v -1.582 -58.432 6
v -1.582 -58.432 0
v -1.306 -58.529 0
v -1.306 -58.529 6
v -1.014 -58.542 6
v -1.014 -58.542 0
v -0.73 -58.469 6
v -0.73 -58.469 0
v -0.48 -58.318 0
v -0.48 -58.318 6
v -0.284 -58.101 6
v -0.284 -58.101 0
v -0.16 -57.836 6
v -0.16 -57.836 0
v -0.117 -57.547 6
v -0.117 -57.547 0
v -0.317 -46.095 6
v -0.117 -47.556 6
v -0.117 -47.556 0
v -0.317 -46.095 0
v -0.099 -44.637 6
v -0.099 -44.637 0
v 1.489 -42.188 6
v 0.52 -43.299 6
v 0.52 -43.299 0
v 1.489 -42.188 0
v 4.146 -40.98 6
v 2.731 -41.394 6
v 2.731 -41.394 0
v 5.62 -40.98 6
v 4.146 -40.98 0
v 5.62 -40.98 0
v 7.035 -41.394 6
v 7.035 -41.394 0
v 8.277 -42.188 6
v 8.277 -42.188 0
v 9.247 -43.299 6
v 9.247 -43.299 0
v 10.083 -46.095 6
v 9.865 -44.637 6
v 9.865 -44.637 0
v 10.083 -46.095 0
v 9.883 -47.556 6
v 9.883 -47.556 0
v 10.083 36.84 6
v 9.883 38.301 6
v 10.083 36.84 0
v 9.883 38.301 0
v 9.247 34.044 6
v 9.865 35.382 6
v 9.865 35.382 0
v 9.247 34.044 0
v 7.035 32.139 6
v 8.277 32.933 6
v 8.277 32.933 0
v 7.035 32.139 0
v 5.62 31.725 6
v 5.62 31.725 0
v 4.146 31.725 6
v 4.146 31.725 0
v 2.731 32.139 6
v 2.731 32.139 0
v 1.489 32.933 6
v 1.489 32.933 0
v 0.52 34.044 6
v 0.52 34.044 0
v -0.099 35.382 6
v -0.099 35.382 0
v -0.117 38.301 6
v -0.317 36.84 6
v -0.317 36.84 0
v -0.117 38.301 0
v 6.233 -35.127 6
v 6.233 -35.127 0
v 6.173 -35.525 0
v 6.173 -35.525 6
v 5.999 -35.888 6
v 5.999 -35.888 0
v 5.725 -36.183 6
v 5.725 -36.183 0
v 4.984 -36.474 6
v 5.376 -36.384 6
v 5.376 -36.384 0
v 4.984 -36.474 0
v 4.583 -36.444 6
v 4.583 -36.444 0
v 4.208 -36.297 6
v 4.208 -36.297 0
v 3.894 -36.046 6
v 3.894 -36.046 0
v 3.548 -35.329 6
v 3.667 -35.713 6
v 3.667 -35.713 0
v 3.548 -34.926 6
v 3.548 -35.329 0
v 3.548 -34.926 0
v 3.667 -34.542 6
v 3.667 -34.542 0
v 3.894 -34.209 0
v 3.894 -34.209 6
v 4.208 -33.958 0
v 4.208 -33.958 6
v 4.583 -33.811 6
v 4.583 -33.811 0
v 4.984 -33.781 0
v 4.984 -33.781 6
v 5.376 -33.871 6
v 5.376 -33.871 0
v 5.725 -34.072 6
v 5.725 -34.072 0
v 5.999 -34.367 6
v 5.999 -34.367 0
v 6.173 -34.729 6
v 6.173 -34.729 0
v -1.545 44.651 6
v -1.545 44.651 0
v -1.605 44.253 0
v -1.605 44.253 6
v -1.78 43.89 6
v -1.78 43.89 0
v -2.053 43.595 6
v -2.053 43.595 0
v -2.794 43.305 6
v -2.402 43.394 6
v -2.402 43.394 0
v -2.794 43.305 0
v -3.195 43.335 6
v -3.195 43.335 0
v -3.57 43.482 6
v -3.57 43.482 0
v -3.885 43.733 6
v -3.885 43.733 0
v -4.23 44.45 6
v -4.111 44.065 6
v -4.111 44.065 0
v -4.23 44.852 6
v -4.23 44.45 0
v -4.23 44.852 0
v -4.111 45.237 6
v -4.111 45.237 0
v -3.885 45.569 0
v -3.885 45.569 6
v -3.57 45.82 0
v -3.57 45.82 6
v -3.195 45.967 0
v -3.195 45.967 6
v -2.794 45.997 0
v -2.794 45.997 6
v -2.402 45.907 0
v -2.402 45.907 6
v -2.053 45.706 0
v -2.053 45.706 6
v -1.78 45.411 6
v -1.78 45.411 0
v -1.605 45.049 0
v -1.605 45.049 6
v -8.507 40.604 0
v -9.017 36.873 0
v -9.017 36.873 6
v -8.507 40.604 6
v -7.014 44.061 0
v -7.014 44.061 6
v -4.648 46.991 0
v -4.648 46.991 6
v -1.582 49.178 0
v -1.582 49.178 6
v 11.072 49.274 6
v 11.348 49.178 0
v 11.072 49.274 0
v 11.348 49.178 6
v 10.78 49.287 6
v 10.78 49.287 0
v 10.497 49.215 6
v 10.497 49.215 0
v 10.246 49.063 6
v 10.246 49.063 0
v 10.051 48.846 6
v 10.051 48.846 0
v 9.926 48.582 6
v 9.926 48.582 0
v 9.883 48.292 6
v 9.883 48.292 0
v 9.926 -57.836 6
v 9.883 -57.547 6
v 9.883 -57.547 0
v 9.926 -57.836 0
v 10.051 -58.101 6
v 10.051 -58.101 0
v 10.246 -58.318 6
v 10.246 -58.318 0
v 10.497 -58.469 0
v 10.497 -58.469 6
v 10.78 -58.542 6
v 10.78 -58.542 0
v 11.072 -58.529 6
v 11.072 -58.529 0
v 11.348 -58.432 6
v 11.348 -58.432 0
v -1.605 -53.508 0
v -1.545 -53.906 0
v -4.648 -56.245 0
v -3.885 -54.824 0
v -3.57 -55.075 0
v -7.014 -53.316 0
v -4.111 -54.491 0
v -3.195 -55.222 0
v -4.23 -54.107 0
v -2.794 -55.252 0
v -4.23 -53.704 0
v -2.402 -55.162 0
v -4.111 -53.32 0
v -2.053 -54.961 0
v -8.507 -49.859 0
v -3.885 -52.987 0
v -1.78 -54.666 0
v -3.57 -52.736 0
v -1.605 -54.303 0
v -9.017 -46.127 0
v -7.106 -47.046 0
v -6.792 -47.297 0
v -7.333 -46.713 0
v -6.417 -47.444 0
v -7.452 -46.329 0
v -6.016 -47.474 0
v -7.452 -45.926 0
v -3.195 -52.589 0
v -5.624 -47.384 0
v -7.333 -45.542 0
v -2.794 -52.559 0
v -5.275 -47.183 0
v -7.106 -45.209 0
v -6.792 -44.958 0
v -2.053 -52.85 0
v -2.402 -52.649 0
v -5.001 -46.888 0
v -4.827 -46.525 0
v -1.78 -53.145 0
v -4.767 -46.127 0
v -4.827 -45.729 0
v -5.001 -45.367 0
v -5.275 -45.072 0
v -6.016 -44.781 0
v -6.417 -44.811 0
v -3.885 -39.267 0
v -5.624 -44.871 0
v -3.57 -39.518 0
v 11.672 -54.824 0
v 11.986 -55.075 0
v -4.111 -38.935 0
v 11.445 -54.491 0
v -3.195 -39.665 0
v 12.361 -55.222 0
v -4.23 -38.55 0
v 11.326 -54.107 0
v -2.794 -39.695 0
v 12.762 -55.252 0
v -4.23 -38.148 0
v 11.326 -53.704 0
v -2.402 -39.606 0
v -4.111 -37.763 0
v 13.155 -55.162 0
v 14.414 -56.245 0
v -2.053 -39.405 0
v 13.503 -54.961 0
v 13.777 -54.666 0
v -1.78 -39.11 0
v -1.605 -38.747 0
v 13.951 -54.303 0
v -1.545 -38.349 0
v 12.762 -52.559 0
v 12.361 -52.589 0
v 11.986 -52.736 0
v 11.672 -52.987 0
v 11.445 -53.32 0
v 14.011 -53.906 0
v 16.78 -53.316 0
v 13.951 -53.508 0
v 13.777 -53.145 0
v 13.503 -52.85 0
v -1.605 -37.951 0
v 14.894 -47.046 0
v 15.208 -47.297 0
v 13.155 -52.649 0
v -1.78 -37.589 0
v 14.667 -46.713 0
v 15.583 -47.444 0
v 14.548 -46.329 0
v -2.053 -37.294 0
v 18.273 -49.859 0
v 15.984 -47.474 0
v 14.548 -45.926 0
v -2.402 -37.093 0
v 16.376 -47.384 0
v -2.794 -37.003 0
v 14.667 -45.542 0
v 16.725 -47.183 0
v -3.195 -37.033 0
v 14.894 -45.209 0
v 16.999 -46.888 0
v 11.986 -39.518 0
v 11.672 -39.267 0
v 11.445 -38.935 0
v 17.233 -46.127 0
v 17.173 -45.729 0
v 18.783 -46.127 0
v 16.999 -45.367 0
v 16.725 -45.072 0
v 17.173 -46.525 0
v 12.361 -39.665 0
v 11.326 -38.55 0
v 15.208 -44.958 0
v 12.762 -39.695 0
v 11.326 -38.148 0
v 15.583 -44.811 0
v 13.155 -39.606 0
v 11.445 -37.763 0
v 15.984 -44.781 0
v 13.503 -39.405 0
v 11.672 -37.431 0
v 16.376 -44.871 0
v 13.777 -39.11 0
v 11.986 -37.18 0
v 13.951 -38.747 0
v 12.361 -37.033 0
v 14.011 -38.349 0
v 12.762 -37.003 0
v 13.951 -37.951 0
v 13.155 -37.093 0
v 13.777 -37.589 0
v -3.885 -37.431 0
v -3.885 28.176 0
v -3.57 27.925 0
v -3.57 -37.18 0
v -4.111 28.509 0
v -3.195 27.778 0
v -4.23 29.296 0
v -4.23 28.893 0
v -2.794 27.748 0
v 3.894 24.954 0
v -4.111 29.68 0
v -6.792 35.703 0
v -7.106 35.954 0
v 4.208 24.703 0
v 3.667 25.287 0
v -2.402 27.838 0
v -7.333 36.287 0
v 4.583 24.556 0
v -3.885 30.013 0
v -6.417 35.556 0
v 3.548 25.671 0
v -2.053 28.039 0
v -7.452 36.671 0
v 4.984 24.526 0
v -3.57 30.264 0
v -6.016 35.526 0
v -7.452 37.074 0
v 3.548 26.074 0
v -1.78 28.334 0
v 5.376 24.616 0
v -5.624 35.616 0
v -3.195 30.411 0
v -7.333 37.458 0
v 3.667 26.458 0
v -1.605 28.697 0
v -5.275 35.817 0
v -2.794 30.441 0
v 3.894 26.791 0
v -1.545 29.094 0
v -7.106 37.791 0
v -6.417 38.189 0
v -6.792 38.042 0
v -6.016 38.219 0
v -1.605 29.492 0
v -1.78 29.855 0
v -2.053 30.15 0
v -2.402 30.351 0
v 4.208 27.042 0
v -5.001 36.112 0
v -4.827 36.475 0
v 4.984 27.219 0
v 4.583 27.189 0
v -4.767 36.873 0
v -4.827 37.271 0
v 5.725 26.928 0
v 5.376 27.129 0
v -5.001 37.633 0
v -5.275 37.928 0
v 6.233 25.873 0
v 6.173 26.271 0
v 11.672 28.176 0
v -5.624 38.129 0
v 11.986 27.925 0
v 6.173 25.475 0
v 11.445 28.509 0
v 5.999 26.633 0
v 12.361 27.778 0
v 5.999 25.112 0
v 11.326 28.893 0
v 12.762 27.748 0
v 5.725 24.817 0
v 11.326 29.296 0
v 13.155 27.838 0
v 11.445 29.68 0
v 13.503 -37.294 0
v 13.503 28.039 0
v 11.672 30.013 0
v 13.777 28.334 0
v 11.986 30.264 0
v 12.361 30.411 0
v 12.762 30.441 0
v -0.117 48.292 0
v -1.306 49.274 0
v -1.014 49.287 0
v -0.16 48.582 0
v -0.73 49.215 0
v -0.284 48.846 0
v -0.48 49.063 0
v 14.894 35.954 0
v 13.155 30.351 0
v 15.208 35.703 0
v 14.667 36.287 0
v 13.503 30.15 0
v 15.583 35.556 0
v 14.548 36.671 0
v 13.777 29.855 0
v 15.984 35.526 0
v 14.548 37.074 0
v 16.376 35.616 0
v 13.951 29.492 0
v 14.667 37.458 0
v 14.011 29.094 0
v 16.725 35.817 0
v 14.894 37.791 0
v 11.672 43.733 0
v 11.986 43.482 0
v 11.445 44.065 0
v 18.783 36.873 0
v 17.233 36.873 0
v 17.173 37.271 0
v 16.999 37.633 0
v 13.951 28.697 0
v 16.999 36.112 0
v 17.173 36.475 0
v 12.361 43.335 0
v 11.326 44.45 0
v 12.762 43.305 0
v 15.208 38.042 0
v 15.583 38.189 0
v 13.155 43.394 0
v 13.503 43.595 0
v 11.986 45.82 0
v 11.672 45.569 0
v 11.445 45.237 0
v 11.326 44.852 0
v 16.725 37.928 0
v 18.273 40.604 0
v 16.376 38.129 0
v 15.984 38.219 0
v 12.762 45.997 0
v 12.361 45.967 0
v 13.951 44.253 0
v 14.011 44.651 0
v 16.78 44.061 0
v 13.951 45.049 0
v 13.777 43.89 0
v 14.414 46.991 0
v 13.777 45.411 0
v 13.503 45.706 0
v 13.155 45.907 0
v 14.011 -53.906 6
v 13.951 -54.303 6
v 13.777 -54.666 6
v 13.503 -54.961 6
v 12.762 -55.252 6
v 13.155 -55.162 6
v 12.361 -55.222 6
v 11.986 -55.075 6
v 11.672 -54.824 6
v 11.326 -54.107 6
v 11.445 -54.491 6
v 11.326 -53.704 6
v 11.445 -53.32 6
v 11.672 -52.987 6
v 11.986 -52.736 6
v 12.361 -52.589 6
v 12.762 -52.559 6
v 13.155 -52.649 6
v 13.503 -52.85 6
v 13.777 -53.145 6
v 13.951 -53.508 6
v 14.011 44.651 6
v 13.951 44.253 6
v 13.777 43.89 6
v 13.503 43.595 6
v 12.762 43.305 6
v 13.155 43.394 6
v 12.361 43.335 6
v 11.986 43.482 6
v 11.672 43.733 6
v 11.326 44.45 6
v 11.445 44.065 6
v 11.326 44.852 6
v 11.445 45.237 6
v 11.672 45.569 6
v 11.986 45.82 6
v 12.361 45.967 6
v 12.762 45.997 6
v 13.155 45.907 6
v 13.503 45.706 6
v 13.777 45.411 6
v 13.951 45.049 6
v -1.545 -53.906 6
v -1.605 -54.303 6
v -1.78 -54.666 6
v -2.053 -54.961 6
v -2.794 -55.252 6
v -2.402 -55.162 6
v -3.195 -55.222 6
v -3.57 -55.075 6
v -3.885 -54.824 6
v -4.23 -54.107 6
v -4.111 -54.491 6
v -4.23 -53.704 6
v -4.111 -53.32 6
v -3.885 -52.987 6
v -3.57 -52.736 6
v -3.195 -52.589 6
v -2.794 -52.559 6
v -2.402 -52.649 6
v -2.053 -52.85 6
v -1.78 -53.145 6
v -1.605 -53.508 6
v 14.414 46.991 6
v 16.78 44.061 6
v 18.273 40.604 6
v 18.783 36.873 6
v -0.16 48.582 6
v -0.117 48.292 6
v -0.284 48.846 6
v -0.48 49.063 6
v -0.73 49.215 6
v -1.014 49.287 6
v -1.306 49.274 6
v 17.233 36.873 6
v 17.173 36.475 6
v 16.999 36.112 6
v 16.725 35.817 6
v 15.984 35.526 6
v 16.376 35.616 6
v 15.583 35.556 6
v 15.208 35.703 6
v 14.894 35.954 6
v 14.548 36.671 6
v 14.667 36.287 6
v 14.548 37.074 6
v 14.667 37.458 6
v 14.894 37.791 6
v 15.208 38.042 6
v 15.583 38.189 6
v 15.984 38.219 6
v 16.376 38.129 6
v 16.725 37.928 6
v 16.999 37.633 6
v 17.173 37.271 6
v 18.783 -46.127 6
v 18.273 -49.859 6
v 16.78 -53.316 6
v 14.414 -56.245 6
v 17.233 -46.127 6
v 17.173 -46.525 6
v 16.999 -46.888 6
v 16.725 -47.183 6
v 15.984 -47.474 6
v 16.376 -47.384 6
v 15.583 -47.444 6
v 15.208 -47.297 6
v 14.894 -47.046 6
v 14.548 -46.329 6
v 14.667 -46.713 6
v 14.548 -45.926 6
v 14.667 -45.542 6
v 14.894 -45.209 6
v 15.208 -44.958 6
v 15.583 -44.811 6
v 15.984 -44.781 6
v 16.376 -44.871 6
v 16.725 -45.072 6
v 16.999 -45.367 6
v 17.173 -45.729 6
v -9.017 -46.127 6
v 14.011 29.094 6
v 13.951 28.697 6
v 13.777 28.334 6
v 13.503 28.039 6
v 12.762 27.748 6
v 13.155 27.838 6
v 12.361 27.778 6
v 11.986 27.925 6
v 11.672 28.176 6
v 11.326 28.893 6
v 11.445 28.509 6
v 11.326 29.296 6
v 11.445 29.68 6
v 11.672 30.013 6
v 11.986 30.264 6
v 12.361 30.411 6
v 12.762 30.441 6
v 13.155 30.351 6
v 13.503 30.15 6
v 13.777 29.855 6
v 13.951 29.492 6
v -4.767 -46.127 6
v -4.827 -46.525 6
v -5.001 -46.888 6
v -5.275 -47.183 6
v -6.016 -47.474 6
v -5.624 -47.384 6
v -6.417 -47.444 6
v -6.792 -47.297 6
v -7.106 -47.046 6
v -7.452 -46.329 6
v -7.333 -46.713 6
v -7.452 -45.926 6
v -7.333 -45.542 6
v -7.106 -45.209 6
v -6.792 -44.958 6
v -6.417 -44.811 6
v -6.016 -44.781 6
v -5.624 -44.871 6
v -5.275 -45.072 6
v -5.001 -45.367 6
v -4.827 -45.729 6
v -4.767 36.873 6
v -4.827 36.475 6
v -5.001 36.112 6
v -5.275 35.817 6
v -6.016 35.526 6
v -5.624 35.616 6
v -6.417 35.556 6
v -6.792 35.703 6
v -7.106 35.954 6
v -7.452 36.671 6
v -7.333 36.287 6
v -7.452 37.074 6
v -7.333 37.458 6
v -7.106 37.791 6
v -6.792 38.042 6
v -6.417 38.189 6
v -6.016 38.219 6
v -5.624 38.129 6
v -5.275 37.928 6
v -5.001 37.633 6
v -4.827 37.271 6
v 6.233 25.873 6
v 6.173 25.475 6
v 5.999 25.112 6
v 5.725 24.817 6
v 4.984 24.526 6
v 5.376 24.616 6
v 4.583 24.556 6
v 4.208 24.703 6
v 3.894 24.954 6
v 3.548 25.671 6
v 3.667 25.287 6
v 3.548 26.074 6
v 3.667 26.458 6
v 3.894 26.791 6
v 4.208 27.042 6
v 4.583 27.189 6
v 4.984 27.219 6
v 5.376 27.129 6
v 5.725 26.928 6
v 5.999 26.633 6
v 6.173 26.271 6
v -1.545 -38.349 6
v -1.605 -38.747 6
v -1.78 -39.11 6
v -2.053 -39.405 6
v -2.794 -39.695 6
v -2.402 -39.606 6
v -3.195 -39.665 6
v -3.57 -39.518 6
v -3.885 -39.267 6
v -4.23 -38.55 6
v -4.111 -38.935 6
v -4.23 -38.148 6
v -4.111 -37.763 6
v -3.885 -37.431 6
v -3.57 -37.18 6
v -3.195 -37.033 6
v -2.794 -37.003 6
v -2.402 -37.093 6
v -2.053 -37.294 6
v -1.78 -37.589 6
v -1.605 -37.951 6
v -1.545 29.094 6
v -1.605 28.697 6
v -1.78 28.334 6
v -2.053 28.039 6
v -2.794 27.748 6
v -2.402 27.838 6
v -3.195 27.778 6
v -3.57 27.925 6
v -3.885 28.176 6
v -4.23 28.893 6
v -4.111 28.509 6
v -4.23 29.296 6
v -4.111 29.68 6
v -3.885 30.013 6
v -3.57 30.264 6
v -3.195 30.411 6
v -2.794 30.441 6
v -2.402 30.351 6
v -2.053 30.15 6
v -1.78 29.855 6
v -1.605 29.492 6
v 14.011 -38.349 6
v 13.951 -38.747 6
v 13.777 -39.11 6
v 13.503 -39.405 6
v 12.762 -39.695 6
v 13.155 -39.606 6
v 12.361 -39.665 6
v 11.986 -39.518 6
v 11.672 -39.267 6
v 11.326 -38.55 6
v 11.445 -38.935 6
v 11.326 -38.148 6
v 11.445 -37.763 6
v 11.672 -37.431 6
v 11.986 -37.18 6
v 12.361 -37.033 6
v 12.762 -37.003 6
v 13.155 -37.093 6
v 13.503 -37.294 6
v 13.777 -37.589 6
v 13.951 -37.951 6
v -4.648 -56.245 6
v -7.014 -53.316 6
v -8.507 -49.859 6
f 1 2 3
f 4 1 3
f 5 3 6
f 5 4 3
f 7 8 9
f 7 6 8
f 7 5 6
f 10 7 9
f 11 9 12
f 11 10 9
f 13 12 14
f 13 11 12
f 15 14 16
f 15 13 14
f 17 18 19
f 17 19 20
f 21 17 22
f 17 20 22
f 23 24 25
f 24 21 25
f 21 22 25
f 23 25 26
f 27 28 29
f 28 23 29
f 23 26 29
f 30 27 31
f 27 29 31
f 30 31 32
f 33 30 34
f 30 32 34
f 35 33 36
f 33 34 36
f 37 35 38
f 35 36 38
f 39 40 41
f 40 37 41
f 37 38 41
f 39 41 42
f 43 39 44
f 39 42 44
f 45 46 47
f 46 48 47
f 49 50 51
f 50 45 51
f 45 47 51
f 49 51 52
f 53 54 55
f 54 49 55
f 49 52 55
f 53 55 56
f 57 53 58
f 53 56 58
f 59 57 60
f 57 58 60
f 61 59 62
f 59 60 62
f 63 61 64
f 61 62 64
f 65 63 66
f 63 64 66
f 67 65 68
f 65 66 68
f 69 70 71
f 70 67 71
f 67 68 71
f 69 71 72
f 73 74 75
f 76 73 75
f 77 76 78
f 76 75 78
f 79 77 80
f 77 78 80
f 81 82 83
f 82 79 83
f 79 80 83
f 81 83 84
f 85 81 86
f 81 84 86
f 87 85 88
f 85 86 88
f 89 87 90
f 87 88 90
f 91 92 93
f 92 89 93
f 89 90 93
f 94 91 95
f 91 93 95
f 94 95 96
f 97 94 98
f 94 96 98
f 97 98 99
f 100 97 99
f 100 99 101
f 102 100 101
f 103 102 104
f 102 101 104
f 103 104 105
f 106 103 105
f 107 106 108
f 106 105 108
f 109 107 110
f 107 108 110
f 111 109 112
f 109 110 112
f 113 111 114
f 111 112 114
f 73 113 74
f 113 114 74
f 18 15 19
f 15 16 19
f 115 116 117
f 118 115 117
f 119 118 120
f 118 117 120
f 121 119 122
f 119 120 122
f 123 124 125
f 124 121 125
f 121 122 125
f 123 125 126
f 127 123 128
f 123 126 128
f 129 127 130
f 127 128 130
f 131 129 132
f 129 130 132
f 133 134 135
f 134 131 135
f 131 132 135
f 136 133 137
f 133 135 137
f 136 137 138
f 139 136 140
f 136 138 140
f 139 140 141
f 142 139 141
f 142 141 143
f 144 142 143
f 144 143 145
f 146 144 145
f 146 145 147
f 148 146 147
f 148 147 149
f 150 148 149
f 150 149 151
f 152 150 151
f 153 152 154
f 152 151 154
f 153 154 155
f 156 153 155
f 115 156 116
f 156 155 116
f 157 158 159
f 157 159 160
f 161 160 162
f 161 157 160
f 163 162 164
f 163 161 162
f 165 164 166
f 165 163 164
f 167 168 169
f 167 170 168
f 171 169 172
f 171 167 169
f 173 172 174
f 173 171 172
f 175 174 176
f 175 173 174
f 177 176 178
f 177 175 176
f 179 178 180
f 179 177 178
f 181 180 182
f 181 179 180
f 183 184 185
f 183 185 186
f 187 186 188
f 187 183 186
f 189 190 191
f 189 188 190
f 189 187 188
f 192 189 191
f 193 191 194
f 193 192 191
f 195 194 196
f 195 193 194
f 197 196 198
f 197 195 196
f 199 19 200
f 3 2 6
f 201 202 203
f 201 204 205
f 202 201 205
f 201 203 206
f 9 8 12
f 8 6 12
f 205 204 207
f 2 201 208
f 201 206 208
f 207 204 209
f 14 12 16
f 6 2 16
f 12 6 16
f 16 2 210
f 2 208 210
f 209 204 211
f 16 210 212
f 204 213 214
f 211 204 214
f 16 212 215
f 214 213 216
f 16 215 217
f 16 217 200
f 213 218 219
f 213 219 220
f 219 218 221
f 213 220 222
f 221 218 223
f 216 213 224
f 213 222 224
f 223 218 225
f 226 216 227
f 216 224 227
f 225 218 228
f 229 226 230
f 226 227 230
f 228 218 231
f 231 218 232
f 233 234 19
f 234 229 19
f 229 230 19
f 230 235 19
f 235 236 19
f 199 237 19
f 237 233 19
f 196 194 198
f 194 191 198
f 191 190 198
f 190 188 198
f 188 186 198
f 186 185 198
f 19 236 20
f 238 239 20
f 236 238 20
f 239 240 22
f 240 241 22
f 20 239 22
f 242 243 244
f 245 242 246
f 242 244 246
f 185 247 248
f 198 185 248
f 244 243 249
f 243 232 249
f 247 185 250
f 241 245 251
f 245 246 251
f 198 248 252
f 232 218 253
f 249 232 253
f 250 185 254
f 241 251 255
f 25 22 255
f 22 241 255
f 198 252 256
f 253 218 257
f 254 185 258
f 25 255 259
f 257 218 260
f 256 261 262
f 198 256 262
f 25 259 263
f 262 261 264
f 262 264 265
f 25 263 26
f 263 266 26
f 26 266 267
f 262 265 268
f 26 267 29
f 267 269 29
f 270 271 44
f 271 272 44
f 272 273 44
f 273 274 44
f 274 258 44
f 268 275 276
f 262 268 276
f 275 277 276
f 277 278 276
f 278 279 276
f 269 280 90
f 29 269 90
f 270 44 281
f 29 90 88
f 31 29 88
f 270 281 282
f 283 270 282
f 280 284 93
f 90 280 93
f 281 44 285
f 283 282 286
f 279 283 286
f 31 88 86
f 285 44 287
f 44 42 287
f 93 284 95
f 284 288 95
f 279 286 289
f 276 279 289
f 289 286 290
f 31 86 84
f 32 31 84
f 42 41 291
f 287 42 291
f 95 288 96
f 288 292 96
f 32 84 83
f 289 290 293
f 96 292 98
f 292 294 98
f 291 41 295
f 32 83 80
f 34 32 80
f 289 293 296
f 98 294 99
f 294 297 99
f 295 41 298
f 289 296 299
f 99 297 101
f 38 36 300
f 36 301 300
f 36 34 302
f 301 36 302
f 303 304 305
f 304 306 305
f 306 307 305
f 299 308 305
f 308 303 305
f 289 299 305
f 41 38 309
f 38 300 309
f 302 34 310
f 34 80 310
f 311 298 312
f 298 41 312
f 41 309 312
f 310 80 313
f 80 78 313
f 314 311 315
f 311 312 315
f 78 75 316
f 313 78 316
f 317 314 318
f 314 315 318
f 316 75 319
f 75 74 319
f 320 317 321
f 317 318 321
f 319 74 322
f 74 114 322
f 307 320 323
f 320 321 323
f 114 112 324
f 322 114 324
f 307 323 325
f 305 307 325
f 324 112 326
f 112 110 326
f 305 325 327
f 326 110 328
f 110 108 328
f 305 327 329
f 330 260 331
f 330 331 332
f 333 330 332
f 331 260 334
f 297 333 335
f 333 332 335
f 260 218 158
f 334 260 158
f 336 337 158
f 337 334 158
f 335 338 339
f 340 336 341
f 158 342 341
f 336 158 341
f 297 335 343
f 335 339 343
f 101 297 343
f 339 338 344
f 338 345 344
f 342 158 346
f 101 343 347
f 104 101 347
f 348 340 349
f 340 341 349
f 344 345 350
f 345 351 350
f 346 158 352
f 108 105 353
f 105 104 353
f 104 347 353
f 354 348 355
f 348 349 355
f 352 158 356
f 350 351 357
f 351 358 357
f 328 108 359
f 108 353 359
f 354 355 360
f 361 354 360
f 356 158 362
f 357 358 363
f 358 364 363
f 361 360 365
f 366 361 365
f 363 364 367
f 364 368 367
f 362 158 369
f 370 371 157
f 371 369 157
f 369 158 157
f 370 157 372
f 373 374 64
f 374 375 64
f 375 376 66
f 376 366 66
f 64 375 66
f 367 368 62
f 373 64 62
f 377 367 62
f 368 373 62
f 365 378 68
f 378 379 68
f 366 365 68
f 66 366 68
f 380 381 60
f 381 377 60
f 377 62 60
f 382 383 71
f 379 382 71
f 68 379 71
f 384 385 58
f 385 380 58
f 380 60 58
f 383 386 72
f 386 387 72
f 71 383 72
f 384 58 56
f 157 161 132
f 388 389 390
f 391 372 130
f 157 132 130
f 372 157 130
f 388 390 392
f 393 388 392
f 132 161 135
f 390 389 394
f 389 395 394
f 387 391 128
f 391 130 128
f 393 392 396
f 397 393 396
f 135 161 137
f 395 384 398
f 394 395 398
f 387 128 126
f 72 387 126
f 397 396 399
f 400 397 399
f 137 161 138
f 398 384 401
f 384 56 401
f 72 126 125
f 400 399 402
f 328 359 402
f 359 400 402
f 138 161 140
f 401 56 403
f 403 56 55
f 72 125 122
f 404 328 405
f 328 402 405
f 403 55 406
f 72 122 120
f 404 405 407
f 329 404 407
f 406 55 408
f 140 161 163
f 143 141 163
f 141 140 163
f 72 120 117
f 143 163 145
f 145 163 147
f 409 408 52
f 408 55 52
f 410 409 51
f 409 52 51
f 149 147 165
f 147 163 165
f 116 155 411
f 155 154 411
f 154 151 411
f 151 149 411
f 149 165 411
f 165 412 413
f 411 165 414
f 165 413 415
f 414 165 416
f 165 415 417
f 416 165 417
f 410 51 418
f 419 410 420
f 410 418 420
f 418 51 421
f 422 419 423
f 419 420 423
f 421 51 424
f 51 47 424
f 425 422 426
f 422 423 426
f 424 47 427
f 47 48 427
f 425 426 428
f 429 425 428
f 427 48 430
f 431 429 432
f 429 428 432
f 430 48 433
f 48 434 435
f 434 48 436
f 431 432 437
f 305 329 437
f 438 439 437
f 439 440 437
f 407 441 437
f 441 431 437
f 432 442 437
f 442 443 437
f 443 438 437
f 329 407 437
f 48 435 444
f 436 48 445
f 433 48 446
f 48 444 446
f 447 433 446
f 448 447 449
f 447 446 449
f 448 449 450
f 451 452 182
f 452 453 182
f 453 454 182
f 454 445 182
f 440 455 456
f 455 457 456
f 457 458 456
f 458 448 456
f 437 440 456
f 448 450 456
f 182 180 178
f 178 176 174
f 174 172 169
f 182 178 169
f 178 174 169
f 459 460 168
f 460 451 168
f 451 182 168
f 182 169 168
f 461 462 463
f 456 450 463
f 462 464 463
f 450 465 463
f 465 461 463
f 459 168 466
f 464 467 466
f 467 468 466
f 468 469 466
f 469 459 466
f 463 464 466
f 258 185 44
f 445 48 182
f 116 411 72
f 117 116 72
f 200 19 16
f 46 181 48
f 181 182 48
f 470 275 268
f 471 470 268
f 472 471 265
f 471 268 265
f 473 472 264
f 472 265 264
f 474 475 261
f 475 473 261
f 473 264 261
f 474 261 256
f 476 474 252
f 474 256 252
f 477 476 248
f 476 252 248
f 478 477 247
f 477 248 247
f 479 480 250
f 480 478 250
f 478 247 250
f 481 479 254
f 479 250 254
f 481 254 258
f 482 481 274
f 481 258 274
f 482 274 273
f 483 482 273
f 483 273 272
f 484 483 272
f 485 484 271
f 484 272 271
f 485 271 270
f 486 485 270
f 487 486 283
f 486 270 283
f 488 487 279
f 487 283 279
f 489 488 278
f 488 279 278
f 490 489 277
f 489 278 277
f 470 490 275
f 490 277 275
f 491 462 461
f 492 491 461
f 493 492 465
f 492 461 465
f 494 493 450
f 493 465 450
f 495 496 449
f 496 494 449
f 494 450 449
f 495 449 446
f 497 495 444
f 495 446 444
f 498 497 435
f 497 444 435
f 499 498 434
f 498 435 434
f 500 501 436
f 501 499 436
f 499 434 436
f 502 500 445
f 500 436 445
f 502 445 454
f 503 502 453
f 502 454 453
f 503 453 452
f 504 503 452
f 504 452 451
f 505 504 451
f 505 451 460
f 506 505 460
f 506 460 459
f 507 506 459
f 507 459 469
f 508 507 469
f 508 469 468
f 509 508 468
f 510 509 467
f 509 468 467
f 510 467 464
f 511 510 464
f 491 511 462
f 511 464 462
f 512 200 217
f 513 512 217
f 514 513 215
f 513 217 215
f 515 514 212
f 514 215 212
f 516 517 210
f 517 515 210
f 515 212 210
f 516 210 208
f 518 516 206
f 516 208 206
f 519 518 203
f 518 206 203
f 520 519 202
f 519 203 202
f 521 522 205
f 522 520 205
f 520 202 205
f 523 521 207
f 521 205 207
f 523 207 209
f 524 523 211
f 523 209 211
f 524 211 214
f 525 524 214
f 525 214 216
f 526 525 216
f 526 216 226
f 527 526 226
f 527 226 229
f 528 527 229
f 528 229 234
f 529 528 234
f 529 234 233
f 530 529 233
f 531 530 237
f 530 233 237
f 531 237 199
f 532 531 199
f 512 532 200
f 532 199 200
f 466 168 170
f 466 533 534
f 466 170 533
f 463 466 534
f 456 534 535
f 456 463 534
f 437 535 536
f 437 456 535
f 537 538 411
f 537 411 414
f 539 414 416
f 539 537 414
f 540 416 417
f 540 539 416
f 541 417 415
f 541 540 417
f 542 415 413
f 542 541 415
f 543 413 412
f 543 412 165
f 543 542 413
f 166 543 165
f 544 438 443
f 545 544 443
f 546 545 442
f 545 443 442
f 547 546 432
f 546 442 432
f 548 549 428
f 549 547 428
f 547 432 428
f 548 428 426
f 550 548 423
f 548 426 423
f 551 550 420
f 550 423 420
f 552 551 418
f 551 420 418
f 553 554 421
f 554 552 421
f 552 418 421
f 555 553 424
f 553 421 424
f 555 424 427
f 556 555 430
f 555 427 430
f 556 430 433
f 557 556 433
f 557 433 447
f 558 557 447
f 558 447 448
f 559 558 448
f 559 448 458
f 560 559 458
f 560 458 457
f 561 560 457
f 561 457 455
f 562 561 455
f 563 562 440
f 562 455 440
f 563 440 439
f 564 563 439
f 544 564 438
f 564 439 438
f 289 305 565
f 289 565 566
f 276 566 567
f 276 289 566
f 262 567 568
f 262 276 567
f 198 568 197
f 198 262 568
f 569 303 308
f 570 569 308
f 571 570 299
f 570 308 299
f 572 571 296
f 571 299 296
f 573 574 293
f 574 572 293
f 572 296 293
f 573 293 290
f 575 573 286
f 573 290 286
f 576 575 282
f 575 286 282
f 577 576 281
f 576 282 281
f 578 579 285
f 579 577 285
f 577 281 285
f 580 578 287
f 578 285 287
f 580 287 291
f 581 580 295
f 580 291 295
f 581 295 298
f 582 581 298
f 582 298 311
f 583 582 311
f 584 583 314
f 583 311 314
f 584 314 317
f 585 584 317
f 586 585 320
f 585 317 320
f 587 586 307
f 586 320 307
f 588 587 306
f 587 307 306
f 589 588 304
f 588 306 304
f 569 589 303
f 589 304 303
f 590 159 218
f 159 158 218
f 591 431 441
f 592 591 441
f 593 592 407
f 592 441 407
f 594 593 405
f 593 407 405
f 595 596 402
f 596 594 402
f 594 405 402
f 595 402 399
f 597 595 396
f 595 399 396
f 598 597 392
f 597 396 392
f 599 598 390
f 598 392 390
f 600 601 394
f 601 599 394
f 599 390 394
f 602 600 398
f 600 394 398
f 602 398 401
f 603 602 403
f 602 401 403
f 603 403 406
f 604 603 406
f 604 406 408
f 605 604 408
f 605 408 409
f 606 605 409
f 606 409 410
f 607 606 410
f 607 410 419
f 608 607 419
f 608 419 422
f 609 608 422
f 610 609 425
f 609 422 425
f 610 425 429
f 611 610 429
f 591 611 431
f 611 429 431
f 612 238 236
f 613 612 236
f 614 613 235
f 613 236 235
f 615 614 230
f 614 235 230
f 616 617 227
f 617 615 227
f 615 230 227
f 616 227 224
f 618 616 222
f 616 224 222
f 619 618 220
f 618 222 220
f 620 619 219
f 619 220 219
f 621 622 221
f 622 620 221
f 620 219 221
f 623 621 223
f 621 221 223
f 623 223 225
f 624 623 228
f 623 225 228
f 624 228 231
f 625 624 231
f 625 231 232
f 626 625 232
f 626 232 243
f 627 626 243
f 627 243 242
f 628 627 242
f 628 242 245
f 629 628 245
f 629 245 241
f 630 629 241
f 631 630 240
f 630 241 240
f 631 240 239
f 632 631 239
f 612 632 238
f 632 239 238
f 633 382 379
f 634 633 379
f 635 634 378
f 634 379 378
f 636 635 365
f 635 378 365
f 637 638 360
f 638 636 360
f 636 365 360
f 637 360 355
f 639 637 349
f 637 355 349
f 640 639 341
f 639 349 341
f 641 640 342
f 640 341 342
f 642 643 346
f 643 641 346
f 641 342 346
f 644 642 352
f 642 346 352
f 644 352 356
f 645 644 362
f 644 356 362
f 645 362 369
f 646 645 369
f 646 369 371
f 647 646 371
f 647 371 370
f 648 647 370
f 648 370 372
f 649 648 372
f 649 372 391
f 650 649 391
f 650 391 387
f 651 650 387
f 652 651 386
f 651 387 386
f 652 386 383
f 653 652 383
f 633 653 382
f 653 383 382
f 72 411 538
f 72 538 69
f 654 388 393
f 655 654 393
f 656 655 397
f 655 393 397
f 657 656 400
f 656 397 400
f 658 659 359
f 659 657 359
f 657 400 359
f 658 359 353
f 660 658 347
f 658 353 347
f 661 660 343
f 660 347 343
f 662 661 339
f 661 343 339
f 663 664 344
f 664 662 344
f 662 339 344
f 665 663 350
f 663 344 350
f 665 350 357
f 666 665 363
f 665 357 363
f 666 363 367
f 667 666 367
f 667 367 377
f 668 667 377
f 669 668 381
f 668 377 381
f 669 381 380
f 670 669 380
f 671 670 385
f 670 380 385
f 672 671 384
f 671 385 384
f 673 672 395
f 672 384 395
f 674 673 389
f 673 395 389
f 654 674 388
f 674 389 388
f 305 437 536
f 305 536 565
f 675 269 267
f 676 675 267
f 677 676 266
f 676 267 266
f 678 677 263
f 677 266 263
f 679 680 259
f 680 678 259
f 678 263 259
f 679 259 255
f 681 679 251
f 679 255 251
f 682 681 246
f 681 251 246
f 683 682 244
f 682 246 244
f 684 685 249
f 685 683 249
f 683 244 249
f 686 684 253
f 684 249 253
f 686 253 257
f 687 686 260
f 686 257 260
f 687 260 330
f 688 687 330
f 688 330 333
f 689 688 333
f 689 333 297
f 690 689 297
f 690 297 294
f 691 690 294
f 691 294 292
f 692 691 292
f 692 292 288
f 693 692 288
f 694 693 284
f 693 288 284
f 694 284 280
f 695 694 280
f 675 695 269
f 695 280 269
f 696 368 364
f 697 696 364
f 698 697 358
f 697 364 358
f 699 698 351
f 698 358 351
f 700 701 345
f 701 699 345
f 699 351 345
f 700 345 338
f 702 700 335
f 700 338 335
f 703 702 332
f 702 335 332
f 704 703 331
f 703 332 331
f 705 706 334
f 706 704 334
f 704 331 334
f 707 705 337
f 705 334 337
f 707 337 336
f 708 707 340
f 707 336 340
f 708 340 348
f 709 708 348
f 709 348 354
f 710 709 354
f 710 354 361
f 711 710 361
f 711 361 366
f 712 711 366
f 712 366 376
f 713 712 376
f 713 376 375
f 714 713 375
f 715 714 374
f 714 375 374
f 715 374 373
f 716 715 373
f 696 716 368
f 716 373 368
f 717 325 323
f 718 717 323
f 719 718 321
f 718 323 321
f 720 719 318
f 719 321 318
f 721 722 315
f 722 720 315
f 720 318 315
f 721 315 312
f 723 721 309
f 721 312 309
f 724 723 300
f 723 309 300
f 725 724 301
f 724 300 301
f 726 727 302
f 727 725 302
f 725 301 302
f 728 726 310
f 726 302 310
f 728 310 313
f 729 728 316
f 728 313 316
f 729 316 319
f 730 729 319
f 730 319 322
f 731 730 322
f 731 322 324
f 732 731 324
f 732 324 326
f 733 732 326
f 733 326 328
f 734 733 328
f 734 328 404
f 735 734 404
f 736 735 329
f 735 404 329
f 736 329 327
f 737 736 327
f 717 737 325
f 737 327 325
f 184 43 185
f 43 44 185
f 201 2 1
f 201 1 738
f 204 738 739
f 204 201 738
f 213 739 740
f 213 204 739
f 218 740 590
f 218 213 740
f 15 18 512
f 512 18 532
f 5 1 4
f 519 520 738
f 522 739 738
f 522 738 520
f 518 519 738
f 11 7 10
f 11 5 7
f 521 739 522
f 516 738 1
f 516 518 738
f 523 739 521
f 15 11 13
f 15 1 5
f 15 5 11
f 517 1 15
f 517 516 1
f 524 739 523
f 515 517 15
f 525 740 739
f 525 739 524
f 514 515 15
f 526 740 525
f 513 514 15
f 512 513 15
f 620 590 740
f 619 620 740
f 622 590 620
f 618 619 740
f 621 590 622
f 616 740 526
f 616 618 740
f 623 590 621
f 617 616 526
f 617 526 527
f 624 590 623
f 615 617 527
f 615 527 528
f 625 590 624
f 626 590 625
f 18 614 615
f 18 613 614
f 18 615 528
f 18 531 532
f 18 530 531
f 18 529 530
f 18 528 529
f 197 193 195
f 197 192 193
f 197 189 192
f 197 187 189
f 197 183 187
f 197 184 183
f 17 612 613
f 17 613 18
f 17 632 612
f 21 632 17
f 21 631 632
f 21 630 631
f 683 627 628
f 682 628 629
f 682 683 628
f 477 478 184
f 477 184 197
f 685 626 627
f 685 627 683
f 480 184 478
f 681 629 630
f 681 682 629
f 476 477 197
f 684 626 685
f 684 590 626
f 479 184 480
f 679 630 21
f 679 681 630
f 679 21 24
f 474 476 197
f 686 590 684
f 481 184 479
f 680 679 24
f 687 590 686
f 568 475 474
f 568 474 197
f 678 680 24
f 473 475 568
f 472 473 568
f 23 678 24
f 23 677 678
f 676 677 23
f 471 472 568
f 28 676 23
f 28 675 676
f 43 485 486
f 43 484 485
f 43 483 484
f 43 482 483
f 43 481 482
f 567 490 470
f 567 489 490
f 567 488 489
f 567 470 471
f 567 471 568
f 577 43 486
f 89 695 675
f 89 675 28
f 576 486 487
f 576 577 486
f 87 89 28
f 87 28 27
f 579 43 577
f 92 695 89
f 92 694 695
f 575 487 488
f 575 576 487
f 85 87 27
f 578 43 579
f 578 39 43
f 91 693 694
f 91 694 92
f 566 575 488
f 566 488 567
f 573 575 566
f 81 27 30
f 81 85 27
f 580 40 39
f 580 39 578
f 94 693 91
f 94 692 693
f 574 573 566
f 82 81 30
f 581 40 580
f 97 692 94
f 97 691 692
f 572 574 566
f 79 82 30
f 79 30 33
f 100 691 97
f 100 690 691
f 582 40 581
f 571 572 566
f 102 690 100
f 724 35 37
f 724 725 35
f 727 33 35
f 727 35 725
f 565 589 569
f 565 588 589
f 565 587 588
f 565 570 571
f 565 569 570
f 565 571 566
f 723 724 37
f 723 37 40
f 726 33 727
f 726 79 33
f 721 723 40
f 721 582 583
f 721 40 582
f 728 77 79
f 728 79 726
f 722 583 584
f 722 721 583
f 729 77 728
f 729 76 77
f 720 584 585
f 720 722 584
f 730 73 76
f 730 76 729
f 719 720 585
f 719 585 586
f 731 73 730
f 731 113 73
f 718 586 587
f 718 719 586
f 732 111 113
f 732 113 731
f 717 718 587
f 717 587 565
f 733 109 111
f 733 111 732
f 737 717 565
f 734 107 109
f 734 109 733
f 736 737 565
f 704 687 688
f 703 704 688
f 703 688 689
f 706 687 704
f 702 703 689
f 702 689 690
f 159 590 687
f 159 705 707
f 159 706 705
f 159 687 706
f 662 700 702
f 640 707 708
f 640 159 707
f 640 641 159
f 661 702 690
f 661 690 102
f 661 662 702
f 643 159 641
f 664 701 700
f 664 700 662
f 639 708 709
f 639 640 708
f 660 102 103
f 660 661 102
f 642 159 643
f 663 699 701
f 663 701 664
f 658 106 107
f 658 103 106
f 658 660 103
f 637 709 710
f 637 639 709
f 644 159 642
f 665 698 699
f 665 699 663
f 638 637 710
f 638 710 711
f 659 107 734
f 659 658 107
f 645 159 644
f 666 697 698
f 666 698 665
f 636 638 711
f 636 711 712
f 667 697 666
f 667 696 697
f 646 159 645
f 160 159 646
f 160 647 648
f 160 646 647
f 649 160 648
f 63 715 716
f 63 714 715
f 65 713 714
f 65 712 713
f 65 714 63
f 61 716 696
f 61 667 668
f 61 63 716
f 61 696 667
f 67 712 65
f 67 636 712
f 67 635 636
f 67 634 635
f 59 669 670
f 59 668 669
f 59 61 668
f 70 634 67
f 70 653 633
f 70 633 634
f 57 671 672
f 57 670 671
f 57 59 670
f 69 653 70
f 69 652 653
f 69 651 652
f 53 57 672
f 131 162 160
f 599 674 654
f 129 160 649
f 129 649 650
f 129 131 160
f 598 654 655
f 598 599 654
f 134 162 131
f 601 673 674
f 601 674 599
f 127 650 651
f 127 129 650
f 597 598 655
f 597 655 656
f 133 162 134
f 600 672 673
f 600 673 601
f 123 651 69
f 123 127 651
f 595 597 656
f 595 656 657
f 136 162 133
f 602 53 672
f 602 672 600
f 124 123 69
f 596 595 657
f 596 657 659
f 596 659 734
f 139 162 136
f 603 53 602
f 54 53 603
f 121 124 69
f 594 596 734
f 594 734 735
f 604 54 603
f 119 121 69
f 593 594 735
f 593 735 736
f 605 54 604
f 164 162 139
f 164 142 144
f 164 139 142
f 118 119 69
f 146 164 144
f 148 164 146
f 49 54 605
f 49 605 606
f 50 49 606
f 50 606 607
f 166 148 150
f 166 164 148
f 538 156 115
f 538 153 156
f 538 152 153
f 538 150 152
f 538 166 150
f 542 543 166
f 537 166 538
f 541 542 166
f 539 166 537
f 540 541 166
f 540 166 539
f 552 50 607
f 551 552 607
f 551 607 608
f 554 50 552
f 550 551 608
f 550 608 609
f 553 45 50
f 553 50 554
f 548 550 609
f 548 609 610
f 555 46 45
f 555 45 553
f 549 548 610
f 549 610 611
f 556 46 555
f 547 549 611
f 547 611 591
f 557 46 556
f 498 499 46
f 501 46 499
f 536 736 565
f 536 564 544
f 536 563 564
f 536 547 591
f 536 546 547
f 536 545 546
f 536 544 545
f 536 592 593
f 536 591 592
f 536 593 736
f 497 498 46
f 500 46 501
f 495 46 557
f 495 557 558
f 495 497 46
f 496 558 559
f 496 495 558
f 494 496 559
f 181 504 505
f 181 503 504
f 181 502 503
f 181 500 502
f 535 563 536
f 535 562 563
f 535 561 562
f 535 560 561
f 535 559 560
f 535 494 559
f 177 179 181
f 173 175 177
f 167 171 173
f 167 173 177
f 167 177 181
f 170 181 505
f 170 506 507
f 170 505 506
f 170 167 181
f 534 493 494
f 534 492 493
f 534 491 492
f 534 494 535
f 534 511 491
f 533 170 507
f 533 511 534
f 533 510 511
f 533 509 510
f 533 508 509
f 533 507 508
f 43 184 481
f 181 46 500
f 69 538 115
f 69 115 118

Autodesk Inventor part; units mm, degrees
ref_plane "YZ Plane" through (0, 0, 0) normal (1, 0, 0) x (0, 1, 0)
ref_plane "XZ Plane" through (0, 0, 0) normal (0, 1, 0) x (-1, 0, 0)
ref_plane "XY Plane" through (0, 0, 0) normal (0, 0, 1) x (1, 0, 0)
sketch "스케치1" plane through (0, 0, 0) normal (0, 0, 1) x (1, 0, 0)
  circle A0 centre (4.8832, 36.8726) radius 5
  circle A1 centre (4.8832, 47.8726) radius 1.55
  circle A2 centre (4.8832, 36.8726) radius 5
  arc A3 (-0.1168, 38.3009) -> (9.8832, 38.3009) centre (4.8832, 36.8726) ccw
  line L0 (4.8832, 42.0726) -> (9.8832, 42.0726)
  line L1 (4.8832, 42.0726) -> (-0.1168, 42.0726)
  circle A4 centre (4.8832, 36.8726) radius 13.9
  line L2 (9.8832, 42.0726) -> (9.8832, 49.8422)
  line L3 (-0.1168, 42.0726) -> (-0.1168, 49.8422)
  line L4 (9.8832, 42.0726) -> (9.8832, 38.3009)
  line L5 (-0.1168, 42.0726) -> (-0.1168, 38.3009)
  circle A5 centre (4.8832, 36.8726) radius 1.5
  line L6 (18.7832, 36.8726) -> (18.7832, -4.6274)
  line L7 (-9.0168, 36.8726) -> (-9.0168, -4.6274)
  arc A6 (-0.1168, 49.8422) -> (-9.0168, 36.8726) centre (4.8832, 36.8726) ccw
  arc A7 (18.7832, 36.8726) -> (9.8832, 49.8422) centre (4.8832, 36.8726) ccw
  line L8 (-9.0168, -4.6274) -> (18.7832, -4.6274)
  circle A8 centre (4.8832, 36.8726) radius 13.9
  line L9 (-9.0168, -46.1274) -> (-9.0168, -4.6274)
  line L10 (18.7832, -46.1274) -> (18.7832, -4.6274)
  line L11 (18.7832, -4.6274) -> (-9.0168, -4.6274)
  circle A9 centre (-2.895, 44.6508) radius 1.35
  circle A10 centre (-6.1168, 36.8726) radius 1.35
  circle A11 centre (-2.895, 29.0945) radius 1.35
  circle A12 centre (4.8832, 25.8726) radius 1.35
  circle A13 centre (12.6614, 29.0945) radius 1.35
  circle A14 centre (15.8832, 36.8726) radius 1.35
  circle A15 centre (12.6614, 44.6508) radius 1.35
  circle A16 centre (4.8832, -46.1274) radius 5
  circle A17 centre (4.8832, -57.1274) radius 1.55
  circle A18 centre (4.8832, -46.1274) radius 5
  arc A19 (9.8832, -47.5556) -> (-0.1168, -47.5556) centre (4.8832, -46.1274) ccw
  line L12 (4.8832, -51.3274) -> (-0.1168, -51.3274)
  line L13 (4.8832, -51.3274) -> (9.8832, -51.3274)
  line L14 (-0.1168, -51.3274) -> (-0.1168, -59.0969)
  line L15 (9.8832, -51.3274) -> (9.8832, -59.0969)
  line L16 (-0.1168, -51.3274) -> (-0.1168, -47.5556)
  line L17 (9.8832, -51.3274) -> (9.8832, -47.5556)
  circle A20 centre (4.8832, -46.1274) radius 1.5
  circle A21 centre (12.6614, -53.9055) radius 1.35
  circle A22 centre (15.8832, -46.1274) radius 1.35
  circle A23 centre (12.6614, -38.3492) radius 1.35
  circle A24 centre (4.8832, -35.1274) radius 1.35
  circle A25 centre (-2.895, -38.3492) radius 1.35
  circle A26 centre (-6.1168, -46.1274) radius 1.35
  circle A27 centre (-2.895, -53.9055) radius 1.35
  circle A28 centre (4.8832, -46.1274) radius 13.9
  point P0 (0, 0)
  point P1 (18.7832, -4.6274)
  point P2 (18.7832, -46.1274)
  dimension "d0" = 0.2
  dimension "d8" = 41.5
  dimension "d9" = 41.5
  dimension "d13" = 41.5
  dimension "d14" = 41.5
  dimension "d15" = 2.7
  dimension "d16" = 2.7
  dimension "d17" = 2.7
  dimension "d18" = 2.7
  dimension "d19" = 2.7
  dimension "d20" = 2.7
  dimension "d21" = 2.7
  dimension "d24" = 0.2
  dimension "d25" = 2.7
  dimension "d26" = 2.7
  dimension "d27" = 2.7
  dimension "d28" = 2.7
  dimension "d29" = 2.7
  dimension "d30" = 2.7
  dimension "d31" = 2.7
  dimension "d32" = 27.8
extrude "돌출1" add sketch "스케치1" along normal blind 6 contours A3 L4 L2 A4 L3 L5 | A4 L6 L8 L7 | L8 L10 A28 L9 | A28 L15 L17 A19 L16 L14
fillet "모깎기1" radius 1 4 edges at (-0.1168, 49.8422, 3) (9.8832, 49.8422, 3) (-0.1168, -59.0969, 3) (9.8832, -59.0969, 3)
properties part number "frame_ankle_to_knee1" material "PMMA 플라스틱"
